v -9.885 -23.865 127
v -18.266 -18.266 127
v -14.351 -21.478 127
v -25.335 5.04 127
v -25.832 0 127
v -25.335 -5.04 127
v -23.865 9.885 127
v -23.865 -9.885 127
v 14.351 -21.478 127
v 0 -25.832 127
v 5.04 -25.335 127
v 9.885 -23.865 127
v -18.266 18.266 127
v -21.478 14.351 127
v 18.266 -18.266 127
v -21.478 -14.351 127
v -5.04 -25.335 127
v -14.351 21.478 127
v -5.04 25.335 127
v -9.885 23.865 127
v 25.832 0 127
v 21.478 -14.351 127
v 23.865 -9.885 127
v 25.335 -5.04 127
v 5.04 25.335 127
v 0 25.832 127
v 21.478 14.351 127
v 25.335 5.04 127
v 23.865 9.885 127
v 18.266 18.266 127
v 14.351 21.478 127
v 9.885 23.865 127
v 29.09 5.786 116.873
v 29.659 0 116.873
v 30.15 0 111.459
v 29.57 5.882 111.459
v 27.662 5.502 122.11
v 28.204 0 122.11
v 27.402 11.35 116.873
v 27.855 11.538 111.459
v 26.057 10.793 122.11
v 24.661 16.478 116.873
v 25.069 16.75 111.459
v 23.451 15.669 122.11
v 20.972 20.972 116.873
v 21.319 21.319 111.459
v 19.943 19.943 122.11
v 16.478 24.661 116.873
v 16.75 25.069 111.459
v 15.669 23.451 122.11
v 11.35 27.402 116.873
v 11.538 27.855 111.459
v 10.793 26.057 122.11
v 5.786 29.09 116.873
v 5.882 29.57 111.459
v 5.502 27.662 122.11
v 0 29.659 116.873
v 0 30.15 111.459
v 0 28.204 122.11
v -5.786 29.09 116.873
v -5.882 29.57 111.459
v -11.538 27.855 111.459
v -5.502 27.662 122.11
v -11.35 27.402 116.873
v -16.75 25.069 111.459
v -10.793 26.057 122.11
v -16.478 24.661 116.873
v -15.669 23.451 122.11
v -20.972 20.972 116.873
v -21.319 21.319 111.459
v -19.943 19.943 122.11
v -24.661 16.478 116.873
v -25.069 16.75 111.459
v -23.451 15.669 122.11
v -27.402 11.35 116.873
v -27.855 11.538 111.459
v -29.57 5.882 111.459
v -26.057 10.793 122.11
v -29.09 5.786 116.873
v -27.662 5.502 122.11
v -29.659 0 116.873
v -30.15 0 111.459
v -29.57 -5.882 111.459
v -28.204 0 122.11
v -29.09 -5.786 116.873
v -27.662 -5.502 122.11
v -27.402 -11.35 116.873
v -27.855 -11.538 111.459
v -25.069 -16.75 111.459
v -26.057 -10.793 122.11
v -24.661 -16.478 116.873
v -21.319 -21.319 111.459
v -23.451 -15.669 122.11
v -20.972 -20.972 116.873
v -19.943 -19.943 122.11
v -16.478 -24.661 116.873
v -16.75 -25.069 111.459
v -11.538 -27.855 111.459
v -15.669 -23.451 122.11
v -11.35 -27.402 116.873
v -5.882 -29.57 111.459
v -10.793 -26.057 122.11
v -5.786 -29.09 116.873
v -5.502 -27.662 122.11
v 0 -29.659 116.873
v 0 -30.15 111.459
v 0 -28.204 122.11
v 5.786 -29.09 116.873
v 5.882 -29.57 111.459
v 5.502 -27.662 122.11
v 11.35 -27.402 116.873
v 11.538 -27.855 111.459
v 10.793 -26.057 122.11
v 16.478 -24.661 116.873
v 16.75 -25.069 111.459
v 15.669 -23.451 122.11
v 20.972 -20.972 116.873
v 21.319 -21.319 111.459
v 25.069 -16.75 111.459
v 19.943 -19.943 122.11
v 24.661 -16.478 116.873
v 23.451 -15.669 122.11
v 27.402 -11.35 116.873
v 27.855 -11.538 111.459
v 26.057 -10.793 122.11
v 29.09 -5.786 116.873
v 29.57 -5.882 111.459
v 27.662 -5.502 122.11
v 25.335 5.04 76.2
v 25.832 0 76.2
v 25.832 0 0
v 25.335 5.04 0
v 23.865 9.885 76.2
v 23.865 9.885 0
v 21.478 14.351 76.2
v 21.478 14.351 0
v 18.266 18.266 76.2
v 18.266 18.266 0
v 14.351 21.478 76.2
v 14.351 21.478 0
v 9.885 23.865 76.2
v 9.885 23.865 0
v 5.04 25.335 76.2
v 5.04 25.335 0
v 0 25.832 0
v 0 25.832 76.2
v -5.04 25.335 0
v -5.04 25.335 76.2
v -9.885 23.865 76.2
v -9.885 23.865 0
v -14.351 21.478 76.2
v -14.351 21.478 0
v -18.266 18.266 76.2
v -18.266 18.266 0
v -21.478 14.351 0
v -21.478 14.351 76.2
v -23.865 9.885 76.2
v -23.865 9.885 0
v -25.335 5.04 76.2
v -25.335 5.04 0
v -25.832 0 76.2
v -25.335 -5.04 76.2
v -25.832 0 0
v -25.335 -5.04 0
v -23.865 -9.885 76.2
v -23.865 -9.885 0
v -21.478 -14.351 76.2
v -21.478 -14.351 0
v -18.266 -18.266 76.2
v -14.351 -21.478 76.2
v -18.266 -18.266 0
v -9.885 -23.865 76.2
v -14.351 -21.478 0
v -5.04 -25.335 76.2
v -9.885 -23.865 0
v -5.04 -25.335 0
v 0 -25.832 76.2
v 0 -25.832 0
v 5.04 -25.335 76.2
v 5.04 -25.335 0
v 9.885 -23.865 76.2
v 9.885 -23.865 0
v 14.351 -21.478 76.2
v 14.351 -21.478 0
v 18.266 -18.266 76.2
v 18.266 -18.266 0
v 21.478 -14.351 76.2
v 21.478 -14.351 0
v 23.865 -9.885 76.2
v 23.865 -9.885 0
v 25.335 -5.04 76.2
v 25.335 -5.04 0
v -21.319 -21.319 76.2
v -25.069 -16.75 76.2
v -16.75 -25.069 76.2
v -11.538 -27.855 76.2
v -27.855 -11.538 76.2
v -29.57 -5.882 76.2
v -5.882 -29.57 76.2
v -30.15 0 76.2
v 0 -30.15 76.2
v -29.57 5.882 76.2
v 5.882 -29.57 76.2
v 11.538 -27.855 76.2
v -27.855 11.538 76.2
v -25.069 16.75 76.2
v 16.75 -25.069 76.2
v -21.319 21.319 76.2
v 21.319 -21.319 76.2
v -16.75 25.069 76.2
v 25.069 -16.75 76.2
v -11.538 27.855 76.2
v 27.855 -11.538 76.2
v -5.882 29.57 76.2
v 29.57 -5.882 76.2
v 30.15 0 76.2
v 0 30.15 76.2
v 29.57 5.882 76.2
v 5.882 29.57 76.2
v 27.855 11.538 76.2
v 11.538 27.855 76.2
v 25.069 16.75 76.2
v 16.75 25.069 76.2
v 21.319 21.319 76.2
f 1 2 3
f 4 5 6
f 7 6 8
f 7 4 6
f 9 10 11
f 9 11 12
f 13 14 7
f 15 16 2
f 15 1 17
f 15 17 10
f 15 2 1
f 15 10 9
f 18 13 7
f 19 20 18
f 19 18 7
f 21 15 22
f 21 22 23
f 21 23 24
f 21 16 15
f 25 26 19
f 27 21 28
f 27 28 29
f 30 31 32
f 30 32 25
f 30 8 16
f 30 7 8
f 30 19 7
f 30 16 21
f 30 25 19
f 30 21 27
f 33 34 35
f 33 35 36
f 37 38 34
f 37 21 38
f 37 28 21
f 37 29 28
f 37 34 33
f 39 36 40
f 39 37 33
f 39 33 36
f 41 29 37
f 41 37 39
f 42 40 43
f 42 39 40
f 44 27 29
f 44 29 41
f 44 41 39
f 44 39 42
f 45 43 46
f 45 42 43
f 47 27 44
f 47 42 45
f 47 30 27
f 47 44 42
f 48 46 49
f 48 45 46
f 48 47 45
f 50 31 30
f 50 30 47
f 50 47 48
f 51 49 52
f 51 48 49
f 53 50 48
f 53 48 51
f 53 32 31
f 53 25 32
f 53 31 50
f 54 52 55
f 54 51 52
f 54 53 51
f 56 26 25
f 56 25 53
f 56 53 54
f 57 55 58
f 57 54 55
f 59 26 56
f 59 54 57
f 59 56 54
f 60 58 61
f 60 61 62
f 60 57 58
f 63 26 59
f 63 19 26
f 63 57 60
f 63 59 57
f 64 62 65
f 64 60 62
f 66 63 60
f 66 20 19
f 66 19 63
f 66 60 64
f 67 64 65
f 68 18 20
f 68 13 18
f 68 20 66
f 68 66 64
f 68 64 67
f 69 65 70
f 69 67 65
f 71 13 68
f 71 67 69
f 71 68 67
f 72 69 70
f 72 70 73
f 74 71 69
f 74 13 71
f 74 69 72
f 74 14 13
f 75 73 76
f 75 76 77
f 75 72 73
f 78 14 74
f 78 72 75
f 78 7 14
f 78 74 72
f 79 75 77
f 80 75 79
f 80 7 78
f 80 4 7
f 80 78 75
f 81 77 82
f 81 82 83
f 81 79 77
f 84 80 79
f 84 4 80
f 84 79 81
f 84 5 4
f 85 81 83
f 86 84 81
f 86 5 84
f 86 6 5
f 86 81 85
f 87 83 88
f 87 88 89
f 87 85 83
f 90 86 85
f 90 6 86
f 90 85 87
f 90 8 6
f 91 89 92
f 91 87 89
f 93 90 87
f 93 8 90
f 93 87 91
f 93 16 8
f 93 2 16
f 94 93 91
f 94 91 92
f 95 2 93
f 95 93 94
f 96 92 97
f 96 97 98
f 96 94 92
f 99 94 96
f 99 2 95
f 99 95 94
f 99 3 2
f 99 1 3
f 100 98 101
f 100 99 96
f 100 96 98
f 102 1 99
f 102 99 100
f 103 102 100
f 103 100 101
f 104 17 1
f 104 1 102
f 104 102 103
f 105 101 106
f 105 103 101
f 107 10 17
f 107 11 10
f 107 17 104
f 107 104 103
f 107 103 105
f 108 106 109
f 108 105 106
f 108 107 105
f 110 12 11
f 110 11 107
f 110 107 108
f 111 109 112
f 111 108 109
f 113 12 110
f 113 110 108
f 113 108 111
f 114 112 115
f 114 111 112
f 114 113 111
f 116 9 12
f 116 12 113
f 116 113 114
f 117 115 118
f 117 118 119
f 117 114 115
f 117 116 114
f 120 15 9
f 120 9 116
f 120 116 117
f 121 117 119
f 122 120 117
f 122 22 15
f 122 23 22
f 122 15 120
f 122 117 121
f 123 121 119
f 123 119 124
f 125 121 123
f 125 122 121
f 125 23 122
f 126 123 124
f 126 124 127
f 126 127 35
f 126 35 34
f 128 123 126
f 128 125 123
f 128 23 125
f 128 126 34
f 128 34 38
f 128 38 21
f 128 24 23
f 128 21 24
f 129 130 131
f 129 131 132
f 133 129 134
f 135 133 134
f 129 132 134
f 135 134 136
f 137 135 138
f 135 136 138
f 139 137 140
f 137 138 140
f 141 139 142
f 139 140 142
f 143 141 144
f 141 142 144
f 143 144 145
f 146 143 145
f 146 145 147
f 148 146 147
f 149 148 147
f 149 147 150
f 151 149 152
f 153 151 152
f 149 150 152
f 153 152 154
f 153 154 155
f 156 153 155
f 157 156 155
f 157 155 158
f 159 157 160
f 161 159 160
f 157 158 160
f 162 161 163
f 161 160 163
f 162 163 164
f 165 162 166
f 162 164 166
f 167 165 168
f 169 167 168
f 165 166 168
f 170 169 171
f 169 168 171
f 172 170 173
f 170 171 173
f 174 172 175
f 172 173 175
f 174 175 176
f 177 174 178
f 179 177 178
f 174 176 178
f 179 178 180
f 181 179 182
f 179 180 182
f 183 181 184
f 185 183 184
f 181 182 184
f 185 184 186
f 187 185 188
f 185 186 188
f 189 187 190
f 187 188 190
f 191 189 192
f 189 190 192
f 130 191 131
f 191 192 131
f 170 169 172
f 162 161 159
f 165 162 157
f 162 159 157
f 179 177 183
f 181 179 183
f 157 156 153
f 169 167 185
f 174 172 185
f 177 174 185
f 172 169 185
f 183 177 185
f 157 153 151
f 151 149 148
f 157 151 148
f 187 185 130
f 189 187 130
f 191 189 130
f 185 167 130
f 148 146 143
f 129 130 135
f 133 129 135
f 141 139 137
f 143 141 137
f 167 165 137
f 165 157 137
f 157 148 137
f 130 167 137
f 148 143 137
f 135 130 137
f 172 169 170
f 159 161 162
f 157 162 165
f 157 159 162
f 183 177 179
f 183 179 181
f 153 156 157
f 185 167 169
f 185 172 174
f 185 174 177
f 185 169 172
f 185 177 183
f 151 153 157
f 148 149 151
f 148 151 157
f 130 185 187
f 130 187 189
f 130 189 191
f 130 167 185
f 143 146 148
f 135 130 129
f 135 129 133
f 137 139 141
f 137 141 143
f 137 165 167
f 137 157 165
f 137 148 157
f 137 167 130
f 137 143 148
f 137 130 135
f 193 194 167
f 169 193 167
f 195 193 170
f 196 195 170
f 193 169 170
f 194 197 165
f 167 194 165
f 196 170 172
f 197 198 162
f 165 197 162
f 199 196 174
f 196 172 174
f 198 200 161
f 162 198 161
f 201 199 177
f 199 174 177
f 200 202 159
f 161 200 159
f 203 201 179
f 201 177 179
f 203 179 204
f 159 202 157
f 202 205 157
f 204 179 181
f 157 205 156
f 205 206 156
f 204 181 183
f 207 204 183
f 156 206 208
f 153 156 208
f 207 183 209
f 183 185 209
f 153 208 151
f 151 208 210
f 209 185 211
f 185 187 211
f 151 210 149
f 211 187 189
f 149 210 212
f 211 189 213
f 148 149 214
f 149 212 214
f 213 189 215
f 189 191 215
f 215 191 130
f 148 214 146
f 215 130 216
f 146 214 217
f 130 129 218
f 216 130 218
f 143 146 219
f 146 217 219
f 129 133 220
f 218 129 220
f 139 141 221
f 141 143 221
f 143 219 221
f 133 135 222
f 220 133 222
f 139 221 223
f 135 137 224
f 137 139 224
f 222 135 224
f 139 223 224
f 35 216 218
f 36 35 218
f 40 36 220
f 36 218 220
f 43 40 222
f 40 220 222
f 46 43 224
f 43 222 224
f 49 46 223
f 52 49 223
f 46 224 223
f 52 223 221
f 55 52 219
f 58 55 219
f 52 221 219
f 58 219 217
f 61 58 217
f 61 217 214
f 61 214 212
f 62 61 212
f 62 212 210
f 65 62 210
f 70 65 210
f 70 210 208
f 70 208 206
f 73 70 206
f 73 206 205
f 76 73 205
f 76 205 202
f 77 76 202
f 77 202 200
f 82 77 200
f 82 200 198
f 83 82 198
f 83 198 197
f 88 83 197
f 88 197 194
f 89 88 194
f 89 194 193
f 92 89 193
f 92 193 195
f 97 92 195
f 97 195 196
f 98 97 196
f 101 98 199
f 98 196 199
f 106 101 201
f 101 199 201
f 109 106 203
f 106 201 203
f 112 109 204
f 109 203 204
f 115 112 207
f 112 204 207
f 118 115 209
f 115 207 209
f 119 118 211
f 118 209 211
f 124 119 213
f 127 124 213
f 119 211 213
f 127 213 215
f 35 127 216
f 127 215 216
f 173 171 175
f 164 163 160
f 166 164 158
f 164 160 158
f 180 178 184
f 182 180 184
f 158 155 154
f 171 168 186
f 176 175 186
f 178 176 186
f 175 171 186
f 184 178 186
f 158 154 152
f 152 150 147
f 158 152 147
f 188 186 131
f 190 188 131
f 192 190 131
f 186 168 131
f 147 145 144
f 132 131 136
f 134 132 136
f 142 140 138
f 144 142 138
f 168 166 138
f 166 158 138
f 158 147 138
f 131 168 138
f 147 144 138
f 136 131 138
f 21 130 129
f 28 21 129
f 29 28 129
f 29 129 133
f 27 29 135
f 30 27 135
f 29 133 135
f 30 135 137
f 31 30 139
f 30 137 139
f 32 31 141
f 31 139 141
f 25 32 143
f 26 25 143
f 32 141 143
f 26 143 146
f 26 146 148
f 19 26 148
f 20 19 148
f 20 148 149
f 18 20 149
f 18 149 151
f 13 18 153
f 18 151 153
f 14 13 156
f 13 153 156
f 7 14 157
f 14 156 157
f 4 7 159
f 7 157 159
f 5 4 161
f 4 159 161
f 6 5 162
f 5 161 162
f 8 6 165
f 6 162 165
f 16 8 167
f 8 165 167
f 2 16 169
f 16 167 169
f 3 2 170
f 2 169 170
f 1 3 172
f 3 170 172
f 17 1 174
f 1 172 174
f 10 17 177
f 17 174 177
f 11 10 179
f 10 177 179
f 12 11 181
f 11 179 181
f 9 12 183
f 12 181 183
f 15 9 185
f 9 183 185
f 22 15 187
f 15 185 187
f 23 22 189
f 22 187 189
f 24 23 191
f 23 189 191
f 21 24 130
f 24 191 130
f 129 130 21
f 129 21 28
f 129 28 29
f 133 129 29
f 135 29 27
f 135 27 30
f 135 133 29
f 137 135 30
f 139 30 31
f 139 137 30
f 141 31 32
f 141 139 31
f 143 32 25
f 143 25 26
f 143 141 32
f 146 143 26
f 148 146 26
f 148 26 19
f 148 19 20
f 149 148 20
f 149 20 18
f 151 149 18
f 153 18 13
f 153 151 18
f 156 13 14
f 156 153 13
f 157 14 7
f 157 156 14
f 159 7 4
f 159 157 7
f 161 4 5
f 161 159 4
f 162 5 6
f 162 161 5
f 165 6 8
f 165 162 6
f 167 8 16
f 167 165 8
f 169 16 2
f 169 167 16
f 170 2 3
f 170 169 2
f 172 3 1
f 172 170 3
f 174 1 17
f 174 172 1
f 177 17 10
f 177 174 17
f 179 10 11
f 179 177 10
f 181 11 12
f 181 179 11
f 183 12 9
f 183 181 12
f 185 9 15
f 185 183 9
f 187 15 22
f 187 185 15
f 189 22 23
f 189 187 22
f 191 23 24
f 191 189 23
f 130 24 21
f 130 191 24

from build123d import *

# Parameters (mm, degrees)
F0_R     = 25.8318
F1_DEPTH = 76.2
F2_R     = 30.1498
F2_R_2   = 25.8318
F3_DEPTH = 50.8
F4_DEPTH = 50.8


# Not quite as in the source:
# - a fillet or chamfer that OpenCascade refuses, or shapes differently, is made with other operations: its cross-section is extruded or revolved along the edge and cut away or added


with BuildPart() as f1:
    # F0 (on Top) → F1 (new body)
    with BuildSketch(Plane.XY):
        Circle(F0_R)
    extrude(amount=F1_DEPTH)


with BuildPart() as f3:
    # F2 (on face) → F3 (new body)
    with BuildSketch(Plane.XY.offset(76.2)):
        Circle(F2_R)
        Circle(F2_R_2, mode=Mode.SUBTRACT)
    extrude(amount=F3_DEPTH)

    # F5: fillet of radius 30.1244 on 1 edges, made by hand

    # F5_s1 → F5_t2 (revolve, cut)
    with BuildSketch(Plane.XZ):
        with BuildLine():
            ThreePointArc((30.1498, 111.4594339099), (29.0502323985, 119.5240839085), (25.8318, 127))
            Line((25.8318, 127), (30.1498, 127))
            Line((30.1498, 127), (30.1498, 111.4594339099))
        make_face()
    revolve(axis=Axis((0, 0, 127), (0, 0, 1)), mode=Mode.SUBTRACT)


with BuildPart() as f4:
    # F4 (new): a face of the model
    f4_faces = [f1.part.faces().sort_by_distance(p)[0] for p in [
        (0, 0, 76.2),
    ]]
    extrude(f4_faces, amount=F4_DEPTH)


solid = Compound([f1.part, f3.part, f4.part])
